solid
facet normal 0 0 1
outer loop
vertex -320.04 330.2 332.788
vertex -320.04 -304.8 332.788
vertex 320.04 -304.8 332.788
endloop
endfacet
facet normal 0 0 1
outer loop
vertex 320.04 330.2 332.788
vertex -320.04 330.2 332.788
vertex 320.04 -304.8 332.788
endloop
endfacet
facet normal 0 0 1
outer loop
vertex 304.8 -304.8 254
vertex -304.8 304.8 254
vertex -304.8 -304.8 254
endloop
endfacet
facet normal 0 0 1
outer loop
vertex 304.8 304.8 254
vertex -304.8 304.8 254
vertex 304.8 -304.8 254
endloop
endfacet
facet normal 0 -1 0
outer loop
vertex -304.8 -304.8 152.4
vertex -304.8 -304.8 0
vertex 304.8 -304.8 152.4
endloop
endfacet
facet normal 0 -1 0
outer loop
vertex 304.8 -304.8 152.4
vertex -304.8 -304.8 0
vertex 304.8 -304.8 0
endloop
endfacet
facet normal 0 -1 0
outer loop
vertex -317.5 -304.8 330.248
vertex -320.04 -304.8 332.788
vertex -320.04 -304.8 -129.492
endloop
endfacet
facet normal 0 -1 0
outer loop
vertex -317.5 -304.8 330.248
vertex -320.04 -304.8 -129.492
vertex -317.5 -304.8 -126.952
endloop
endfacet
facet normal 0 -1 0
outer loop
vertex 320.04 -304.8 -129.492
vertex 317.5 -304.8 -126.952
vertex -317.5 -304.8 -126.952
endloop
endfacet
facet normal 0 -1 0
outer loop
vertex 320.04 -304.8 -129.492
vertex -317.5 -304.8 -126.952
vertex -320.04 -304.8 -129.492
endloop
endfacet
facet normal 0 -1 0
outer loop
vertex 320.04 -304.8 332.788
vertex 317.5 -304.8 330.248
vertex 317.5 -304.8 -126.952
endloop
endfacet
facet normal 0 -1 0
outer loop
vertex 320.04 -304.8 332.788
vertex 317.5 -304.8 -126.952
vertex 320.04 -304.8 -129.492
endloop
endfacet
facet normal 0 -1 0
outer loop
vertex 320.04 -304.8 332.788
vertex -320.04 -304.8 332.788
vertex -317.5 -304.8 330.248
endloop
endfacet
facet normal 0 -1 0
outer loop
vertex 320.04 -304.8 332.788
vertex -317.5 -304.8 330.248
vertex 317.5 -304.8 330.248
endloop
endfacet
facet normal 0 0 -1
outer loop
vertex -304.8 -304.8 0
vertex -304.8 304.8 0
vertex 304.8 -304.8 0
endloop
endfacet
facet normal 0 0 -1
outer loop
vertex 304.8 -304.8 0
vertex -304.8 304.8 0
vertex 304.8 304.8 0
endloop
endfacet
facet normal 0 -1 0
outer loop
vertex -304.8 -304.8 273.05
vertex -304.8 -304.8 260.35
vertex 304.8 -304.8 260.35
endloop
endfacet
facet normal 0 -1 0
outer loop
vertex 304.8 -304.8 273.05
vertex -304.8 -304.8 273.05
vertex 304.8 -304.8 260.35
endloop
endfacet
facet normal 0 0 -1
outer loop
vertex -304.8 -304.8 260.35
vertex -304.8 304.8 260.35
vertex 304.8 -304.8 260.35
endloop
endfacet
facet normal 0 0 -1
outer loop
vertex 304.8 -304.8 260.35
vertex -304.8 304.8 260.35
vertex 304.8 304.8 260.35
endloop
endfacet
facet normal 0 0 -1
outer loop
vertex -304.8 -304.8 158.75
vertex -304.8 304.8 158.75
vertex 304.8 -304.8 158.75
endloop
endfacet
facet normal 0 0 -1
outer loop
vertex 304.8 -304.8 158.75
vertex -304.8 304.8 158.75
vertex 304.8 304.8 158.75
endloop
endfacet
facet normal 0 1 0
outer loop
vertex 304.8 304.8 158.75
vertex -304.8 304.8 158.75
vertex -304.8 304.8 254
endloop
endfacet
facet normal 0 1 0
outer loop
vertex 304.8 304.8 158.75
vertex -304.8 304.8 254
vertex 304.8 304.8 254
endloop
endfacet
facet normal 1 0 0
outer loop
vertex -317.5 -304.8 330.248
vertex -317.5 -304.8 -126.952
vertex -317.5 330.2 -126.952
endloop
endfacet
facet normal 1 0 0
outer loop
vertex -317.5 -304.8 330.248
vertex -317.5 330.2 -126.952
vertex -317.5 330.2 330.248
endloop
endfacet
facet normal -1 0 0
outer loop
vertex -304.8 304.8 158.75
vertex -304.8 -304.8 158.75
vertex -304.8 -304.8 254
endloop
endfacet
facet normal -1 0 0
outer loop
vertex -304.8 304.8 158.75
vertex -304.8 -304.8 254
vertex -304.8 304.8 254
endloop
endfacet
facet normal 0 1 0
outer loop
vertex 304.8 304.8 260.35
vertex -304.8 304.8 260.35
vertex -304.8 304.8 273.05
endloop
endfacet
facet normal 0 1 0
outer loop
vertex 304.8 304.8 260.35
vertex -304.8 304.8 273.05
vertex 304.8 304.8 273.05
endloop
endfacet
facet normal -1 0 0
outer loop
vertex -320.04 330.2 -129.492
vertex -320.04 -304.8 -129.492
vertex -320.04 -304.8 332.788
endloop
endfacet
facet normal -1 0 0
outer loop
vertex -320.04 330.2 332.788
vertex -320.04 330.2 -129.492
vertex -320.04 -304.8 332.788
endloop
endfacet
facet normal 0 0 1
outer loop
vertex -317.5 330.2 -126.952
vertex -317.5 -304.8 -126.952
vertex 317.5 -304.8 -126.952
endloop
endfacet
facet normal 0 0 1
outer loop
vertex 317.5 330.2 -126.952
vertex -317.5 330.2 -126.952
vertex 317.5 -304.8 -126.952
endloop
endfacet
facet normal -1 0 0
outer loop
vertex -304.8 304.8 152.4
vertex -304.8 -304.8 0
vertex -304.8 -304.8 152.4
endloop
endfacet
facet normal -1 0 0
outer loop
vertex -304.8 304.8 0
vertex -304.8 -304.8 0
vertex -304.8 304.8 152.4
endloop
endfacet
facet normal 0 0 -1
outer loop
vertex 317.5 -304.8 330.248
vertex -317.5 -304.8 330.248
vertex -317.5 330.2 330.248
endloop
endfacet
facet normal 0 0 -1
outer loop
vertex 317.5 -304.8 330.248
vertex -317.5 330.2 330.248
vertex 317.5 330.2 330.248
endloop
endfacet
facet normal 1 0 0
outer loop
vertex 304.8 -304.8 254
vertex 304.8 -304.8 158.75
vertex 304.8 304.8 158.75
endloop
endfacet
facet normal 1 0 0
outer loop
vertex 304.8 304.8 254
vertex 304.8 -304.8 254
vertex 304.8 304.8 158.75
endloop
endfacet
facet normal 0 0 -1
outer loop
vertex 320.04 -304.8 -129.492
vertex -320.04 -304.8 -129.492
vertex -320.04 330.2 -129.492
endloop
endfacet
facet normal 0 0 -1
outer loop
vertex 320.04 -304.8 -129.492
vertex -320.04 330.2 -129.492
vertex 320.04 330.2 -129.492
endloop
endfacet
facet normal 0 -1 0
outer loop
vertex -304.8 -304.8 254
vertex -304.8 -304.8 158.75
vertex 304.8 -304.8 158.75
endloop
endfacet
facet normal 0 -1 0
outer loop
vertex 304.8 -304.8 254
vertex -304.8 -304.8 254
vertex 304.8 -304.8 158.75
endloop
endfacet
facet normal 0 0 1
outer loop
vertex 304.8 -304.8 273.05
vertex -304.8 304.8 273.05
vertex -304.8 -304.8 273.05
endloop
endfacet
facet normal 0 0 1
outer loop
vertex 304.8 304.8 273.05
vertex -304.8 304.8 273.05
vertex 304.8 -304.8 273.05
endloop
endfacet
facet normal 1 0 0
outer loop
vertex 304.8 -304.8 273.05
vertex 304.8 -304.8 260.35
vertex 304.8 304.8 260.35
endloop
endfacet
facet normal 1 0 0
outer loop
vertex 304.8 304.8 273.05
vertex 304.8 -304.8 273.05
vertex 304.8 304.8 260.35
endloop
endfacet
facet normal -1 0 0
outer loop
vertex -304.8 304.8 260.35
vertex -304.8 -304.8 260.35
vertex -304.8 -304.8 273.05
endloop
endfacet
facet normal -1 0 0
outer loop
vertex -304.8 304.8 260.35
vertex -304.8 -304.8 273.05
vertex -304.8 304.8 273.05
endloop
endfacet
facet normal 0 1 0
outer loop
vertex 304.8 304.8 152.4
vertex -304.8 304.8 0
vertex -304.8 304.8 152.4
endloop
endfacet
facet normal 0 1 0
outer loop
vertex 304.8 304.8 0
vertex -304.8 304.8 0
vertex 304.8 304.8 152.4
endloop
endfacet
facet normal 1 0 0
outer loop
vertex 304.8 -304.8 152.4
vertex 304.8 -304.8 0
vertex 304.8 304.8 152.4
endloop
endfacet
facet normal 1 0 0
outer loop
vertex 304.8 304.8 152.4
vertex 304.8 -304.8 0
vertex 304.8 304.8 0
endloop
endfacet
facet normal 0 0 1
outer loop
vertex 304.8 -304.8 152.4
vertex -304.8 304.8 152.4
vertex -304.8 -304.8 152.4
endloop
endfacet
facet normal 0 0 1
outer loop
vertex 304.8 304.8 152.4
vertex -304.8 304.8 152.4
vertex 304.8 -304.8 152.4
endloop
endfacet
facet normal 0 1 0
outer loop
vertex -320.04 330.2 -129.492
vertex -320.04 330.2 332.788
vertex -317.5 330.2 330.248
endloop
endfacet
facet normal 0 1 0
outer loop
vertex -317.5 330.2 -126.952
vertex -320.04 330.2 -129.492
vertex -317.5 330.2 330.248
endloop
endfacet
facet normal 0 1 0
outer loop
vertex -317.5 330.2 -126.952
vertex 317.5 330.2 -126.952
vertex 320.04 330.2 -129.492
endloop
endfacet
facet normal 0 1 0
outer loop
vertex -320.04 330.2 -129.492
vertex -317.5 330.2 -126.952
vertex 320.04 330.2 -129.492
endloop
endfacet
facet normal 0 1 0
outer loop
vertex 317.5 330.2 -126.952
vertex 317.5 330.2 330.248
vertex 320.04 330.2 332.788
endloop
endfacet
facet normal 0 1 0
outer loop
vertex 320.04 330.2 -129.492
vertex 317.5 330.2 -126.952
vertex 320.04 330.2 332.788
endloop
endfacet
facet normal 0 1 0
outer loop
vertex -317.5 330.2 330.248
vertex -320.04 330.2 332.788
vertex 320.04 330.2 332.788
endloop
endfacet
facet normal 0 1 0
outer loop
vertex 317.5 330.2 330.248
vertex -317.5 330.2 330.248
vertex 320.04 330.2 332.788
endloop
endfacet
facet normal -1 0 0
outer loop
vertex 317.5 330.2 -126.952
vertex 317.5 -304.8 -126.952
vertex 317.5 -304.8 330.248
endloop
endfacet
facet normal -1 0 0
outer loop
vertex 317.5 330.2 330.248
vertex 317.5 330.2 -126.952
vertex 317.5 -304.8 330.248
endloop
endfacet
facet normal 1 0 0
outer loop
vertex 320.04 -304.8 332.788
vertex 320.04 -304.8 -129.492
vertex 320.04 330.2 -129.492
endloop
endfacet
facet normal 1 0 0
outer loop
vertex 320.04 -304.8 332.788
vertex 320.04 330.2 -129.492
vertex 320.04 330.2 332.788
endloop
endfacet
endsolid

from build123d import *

# Parameters (mm, degrees)
SKETCH1_W           = 609.6
SKETCH1_H           = 609.6
BOSS_EXTRUDE1_DEPTH = 152.4
BOSS_EXTRUDE2_START = 6.35
SKETCH2_W           = 609.6
SKETCH2_H           = 609.6
BOSS_EXTRUDE2_DEPTH = 95.25
BOSS_EXTRUDE3_START = 6.35
SKETCH3_W           = 609.6
SKETCH3_H           = 609.6
BOSS_EXTRUDE3_DEPTH = 12.7
SKETCH4_W           = 640.08
SKETCH4_H           = 462.28
SKETCH4_W_2         = 635
SKETCH4_H_2         = 457.2
EXTRUDE_THIN1_DEPTH = 635


with BuildPart() as part:
    # Sketch1 → Boss-Extrude1 (new body)
    with BuildSketch(Plane.XY):
        Rectangle(SKETCH1_W, SKETCH1_H)
    extrude(amount=BOSS_EXTRUDE1_DEPTH)


with BuildPart() as body_2:
    # Sketch2 → Boss-Extrude2 (new body)
    with BuildSketch(Plane.XY.offset(152.4).offset(BOSS_EXTRUDE2_START)):
        Rectangle(SKETCH2_W, SKETCH2_H)
    extrude(amount=BOSS_EXTRUDE2_DEPTH)


with BuildPart() as body_3:
    # Sketch3 → Boss-Extrude3 (new body)
    with BuildSketch(Plane.XY.offset(254).offset(BOSS_EXTRUDE3_START)):
        Rectangle(SKETCH3_W, SKETCH3_H)
    extrude(amount=BOSS_EXTRUDE3_DEPTH)


with BuildPart() as body_4:
    # Sketch4 → Extrude-Thin1 (new body)
    with BuildSketch(Plane.XZ.offset(304.8)):
        with Locations((0, 101.647614288)):
            Rectangle(SKETCH4_W, SKETCH4_H)
        with Locations((0, 101.647614288)):
            Rectangle(SKETCH4_W_2, SKETCH4_H_2, mode=Mode.SUBTRACT)
    extrude(amount=-EXTRUDE_THIN1_DEPTH)


solid = Compound([part.part, body_2.part, body_3.part, body_4.part])
